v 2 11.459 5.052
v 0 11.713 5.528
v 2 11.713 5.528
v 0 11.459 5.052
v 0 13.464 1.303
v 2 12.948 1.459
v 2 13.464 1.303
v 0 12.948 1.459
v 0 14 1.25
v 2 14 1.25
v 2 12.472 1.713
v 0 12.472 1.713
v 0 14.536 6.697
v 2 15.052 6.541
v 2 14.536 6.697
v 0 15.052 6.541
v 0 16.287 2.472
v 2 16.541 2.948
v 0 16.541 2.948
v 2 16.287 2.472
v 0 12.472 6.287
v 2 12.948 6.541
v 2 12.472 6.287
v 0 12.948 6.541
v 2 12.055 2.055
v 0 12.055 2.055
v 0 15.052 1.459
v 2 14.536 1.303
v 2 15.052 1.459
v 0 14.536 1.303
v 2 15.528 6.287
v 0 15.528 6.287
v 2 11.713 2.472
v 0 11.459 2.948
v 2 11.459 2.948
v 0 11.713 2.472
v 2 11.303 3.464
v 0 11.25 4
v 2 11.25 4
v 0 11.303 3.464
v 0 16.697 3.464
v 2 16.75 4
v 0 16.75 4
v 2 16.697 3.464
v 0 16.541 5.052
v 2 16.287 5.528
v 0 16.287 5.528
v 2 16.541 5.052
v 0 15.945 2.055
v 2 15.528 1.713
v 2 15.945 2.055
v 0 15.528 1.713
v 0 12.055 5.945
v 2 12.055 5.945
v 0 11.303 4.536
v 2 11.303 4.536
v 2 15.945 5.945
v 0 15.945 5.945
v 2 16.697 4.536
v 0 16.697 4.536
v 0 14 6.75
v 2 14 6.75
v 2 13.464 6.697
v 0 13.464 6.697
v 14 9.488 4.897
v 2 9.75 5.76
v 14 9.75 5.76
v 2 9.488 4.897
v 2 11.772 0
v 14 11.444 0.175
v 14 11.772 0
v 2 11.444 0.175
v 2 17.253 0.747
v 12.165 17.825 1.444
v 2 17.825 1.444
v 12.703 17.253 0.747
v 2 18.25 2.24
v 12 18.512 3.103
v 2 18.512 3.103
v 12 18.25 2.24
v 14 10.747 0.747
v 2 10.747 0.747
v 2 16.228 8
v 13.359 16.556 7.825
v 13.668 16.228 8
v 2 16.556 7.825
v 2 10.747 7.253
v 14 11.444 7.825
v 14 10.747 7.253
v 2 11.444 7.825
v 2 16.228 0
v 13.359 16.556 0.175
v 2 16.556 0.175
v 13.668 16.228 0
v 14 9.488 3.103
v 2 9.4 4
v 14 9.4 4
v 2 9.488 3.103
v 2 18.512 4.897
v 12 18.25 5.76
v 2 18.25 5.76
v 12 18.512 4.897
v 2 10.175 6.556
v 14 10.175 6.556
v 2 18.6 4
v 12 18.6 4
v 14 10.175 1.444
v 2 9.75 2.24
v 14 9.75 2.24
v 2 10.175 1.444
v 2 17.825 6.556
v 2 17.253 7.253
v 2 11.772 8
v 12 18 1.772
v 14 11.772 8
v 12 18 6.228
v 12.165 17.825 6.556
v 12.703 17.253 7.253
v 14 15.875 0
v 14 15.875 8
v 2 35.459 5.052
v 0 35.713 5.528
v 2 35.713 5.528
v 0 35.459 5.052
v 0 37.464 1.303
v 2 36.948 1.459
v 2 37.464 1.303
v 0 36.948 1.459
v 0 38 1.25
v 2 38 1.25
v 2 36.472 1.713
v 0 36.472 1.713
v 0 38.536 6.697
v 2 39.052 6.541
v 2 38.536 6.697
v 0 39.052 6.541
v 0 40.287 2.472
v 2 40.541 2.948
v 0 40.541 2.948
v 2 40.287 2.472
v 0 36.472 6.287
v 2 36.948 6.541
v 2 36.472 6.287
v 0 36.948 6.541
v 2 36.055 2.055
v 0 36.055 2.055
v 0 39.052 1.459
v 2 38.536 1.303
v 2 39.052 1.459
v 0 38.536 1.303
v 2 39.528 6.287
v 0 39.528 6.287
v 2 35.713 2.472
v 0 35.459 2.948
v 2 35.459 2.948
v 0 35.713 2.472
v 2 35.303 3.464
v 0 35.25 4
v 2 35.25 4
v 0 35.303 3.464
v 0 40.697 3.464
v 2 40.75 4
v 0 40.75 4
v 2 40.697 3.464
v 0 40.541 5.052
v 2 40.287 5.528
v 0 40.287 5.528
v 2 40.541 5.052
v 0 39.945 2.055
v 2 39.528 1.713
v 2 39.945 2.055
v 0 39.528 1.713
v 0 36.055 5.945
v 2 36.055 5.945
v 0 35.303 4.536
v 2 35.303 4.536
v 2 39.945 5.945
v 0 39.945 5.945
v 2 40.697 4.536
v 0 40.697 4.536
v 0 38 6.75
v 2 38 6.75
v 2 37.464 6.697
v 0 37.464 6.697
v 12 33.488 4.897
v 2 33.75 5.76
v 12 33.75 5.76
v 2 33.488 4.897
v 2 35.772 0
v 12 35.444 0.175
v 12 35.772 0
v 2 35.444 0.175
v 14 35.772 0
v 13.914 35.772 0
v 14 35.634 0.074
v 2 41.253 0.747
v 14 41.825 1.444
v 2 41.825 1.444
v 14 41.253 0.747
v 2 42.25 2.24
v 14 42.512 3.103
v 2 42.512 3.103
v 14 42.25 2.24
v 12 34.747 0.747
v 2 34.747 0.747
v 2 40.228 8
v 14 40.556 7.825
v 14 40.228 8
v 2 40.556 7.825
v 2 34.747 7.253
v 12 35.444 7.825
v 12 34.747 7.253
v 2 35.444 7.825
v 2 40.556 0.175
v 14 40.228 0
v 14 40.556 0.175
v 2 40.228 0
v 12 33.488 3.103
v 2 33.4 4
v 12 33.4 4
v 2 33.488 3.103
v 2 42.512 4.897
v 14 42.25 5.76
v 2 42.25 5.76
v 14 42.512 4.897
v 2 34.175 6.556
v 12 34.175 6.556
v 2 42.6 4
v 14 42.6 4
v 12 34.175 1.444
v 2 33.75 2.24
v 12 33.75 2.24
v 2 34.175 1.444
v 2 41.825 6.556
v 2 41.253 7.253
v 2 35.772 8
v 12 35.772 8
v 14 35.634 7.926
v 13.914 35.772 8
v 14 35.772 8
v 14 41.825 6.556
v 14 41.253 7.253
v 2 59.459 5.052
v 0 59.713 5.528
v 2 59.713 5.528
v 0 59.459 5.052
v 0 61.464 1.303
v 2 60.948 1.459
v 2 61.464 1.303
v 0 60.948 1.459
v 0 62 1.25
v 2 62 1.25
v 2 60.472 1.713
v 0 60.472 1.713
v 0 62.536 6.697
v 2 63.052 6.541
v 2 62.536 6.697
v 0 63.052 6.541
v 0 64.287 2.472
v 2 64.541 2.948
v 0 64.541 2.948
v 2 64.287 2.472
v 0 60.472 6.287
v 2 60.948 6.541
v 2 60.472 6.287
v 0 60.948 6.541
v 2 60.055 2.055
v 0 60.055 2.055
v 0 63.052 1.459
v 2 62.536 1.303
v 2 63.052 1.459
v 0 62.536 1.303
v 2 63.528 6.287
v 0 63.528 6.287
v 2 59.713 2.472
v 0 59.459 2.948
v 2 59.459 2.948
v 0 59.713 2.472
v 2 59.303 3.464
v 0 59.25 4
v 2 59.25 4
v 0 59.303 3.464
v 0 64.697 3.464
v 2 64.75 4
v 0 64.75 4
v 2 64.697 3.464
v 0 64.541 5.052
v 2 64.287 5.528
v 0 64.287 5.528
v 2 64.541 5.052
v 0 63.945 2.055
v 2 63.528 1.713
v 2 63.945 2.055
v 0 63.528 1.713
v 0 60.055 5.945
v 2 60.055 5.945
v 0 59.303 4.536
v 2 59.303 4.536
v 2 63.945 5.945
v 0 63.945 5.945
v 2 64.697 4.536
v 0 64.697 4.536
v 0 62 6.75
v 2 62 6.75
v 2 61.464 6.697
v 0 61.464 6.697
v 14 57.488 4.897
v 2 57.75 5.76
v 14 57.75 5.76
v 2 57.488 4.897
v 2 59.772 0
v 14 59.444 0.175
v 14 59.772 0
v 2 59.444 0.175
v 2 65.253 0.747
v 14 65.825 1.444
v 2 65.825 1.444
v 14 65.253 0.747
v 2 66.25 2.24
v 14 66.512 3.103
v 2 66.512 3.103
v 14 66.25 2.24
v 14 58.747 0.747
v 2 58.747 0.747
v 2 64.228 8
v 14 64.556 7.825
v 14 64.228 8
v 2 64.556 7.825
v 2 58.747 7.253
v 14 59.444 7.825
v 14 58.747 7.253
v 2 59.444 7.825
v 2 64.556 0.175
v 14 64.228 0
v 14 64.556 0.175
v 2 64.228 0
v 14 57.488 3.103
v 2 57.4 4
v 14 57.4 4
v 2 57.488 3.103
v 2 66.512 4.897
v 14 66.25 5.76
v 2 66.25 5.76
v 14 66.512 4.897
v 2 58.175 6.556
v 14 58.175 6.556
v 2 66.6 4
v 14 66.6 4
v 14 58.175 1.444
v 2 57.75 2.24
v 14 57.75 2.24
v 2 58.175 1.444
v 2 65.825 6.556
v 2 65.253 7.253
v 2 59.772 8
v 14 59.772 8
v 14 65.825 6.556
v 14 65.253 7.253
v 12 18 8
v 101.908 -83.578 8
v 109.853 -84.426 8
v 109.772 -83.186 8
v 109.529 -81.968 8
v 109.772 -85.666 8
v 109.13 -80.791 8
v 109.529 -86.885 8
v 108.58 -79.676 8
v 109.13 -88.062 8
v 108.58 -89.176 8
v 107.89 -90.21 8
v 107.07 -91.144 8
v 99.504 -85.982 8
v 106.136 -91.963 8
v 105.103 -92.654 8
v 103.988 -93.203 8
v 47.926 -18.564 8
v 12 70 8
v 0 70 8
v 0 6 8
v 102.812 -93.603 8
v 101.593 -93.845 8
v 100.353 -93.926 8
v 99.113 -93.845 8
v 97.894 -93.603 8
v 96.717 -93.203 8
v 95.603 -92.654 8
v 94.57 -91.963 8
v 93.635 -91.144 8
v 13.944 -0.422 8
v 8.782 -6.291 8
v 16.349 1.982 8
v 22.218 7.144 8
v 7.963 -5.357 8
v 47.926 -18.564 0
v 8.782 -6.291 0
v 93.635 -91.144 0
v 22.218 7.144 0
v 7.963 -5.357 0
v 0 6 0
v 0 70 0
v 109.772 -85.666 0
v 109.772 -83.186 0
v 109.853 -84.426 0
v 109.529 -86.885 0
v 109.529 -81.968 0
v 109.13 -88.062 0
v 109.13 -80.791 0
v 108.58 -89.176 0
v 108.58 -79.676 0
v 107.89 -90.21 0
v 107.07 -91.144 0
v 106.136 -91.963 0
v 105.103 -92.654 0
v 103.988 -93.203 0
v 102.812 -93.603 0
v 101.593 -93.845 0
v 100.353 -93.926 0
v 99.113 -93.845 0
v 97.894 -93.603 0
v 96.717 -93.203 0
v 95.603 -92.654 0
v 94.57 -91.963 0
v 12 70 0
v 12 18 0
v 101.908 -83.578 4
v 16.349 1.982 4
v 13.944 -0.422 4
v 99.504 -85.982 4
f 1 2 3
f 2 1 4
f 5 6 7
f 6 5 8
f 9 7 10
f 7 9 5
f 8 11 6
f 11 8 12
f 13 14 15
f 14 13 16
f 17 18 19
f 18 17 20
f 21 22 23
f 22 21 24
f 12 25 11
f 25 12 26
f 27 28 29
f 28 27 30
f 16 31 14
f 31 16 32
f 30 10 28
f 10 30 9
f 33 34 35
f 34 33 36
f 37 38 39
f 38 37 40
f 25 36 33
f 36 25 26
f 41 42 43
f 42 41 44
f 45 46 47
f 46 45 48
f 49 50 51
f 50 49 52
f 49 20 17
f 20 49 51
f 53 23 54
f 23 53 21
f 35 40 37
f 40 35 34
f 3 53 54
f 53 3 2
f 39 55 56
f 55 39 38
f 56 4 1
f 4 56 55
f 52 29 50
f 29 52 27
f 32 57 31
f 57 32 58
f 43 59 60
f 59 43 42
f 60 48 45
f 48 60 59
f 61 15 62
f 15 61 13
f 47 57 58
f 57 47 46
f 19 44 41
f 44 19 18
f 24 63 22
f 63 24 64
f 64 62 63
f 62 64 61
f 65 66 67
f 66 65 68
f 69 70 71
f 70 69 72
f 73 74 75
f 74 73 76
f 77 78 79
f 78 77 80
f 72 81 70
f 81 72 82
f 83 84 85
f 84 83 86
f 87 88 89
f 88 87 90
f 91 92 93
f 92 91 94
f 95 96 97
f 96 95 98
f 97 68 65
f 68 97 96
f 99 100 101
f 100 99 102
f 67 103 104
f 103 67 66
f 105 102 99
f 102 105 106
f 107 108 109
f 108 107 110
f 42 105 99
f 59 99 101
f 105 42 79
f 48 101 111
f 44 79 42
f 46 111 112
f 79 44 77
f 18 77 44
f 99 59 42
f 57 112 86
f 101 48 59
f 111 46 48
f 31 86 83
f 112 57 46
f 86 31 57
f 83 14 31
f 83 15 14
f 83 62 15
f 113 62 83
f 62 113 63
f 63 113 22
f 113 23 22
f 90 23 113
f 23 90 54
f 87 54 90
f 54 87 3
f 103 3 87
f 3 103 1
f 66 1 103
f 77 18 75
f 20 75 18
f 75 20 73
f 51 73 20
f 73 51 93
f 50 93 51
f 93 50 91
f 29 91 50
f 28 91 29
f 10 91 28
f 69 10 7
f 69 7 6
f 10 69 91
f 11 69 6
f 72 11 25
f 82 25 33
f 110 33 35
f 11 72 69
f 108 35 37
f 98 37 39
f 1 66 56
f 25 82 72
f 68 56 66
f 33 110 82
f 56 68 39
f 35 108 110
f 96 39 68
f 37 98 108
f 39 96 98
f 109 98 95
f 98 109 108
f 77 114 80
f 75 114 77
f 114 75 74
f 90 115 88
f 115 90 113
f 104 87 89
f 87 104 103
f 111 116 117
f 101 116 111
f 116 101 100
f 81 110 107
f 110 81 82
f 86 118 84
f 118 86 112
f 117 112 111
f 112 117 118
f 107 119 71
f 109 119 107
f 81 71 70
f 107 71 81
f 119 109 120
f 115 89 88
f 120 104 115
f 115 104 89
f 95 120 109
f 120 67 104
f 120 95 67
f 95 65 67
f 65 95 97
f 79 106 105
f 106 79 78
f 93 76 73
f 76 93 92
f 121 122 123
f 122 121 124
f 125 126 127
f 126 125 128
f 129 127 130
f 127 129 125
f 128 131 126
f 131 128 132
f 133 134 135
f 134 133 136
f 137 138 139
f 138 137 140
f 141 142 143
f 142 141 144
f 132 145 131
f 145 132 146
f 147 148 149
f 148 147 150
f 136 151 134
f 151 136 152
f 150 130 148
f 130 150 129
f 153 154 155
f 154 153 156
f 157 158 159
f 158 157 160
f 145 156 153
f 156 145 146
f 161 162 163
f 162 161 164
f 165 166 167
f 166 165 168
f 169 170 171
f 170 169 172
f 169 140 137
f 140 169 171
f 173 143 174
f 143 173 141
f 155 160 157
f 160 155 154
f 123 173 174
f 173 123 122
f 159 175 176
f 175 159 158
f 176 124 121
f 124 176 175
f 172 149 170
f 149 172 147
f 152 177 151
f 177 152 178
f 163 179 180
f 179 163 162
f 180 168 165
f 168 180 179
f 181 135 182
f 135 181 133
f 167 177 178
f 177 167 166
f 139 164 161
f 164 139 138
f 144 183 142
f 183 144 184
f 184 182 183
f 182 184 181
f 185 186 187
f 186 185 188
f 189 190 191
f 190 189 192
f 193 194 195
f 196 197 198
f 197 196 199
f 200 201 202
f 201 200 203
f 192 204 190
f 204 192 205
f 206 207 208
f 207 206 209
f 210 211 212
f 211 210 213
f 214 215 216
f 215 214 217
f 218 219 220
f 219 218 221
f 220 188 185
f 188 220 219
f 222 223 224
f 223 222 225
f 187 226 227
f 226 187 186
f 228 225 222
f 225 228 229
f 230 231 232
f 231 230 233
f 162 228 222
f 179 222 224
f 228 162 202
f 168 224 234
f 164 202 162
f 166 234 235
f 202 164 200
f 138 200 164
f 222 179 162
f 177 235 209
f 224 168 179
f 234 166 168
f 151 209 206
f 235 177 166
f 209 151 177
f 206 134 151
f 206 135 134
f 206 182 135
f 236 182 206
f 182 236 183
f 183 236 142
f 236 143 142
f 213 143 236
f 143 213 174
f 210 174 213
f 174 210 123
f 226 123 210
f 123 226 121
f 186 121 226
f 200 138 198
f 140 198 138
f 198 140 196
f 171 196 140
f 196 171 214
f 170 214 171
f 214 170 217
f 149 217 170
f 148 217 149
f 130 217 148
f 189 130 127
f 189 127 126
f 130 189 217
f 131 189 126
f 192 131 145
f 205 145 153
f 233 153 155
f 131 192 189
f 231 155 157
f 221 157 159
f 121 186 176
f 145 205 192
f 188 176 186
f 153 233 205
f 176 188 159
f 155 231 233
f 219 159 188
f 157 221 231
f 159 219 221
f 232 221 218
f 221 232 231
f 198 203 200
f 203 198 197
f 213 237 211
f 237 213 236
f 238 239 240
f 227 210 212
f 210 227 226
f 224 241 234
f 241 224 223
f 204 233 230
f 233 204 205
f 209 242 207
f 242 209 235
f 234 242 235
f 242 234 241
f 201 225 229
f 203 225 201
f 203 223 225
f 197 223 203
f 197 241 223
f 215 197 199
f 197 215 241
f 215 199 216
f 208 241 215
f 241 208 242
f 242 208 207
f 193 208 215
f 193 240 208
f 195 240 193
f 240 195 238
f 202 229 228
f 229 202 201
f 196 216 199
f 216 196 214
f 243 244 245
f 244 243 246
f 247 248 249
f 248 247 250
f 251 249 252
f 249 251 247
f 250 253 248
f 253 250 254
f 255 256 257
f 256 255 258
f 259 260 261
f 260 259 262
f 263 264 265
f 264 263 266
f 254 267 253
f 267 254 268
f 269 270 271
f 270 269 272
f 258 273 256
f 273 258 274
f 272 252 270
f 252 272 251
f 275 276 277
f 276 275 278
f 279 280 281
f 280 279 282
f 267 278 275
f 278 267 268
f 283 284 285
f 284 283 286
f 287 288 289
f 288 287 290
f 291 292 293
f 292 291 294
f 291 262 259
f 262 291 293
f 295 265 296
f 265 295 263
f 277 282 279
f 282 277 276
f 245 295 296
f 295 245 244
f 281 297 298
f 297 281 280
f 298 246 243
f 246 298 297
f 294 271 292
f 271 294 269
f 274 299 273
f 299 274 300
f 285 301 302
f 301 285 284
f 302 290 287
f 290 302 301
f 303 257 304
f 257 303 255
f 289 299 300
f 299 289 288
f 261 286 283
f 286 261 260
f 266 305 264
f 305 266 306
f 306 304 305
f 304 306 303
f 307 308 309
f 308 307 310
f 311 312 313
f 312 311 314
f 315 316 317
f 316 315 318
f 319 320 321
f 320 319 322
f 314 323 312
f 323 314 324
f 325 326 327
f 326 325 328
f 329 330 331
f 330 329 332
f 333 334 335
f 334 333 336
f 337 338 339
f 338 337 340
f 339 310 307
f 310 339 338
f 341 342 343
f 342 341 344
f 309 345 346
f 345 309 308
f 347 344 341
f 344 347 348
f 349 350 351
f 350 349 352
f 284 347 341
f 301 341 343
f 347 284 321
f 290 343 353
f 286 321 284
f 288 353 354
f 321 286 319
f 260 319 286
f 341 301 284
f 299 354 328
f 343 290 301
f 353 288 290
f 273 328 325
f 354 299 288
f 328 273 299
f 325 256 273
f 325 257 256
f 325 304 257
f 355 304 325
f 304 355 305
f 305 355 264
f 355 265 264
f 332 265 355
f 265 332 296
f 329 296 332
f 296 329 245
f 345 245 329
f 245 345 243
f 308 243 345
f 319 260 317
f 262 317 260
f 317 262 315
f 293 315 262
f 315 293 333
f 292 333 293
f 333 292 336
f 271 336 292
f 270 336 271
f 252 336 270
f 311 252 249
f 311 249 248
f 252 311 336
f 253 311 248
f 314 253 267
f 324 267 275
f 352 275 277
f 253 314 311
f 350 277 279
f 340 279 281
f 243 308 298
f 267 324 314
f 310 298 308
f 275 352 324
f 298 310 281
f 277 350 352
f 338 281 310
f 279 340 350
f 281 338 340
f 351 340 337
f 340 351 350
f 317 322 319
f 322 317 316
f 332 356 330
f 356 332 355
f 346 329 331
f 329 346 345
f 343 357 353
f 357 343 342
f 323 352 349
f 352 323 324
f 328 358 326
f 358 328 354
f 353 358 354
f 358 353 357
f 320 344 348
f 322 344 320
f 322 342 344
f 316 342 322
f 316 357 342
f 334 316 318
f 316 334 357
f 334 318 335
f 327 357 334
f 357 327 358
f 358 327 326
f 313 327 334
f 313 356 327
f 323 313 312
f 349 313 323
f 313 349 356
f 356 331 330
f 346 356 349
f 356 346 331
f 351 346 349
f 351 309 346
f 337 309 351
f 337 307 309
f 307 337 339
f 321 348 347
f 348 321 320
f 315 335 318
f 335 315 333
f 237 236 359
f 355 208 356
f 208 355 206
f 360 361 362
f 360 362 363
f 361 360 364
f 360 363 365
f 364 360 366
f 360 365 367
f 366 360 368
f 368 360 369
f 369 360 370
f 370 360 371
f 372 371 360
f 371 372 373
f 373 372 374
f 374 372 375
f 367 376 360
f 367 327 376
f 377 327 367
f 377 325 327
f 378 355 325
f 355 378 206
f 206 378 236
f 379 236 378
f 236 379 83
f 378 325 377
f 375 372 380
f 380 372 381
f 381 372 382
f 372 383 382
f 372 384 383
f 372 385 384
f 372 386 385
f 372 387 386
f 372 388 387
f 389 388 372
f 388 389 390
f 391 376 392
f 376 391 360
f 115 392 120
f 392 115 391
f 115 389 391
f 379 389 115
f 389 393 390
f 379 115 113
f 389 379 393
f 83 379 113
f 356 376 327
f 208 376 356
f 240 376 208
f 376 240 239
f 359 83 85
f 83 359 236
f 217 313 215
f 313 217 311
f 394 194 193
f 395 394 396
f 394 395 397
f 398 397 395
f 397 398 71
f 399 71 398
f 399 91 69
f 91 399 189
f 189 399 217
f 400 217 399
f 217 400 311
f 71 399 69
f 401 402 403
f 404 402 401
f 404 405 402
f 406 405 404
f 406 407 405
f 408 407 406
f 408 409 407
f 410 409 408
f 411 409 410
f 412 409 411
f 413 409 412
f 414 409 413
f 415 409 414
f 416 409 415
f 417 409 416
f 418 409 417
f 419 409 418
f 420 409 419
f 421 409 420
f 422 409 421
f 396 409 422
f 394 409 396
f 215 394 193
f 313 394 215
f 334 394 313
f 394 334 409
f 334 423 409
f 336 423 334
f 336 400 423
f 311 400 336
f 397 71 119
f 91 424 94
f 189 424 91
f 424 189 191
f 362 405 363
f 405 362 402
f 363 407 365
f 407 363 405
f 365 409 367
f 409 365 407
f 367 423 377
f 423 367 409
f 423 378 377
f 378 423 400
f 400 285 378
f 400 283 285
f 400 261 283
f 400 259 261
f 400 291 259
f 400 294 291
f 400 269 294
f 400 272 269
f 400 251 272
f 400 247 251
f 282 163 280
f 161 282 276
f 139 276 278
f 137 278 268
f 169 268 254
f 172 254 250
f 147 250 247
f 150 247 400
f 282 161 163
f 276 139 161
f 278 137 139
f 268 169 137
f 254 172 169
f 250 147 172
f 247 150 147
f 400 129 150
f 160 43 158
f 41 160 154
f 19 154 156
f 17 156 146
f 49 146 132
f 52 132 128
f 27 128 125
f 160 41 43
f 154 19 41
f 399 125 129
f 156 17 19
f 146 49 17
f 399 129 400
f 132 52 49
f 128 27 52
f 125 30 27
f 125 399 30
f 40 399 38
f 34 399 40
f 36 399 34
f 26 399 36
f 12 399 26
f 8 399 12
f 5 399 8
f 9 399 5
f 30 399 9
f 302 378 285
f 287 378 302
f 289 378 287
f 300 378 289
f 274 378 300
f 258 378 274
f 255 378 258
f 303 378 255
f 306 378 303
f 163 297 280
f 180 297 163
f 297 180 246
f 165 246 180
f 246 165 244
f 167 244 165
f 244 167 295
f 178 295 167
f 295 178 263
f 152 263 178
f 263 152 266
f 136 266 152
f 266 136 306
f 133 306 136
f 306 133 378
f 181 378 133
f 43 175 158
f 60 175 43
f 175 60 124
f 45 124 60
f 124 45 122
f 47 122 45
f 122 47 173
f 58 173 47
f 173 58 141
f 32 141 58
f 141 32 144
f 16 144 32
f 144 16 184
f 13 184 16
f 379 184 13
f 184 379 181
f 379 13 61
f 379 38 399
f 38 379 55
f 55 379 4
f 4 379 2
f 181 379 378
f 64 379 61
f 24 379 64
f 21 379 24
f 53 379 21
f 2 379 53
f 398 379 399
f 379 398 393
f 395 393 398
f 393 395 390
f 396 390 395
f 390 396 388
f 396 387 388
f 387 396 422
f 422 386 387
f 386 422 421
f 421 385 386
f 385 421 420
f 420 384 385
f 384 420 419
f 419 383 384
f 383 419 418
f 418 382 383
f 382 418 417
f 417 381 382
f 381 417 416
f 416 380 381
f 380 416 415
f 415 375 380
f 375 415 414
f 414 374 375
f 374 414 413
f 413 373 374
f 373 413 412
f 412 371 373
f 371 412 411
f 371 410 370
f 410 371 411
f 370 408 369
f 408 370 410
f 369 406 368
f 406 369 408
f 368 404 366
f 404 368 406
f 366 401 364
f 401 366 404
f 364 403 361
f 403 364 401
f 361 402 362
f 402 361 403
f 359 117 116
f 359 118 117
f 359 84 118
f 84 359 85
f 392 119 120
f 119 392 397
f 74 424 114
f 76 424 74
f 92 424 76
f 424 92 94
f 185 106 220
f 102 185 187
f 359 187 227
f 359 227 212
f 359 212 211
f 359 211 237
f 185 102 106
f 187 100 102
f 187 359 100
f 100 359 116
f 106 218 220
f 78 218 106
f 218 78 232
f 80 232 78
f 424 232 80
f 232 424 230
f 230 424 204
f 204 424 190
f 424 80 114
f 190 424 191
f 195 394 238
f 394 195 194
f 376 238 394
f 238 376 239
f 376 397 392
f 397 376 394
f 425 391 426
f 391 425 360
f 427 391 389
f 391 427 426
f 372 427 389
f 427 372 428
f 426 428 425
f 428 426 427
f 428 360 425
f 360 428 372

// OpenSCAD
include <../lib/meshtastic-drybag-node-lib.scad>;
$fn = 40;
panel_plate_print(-1);
